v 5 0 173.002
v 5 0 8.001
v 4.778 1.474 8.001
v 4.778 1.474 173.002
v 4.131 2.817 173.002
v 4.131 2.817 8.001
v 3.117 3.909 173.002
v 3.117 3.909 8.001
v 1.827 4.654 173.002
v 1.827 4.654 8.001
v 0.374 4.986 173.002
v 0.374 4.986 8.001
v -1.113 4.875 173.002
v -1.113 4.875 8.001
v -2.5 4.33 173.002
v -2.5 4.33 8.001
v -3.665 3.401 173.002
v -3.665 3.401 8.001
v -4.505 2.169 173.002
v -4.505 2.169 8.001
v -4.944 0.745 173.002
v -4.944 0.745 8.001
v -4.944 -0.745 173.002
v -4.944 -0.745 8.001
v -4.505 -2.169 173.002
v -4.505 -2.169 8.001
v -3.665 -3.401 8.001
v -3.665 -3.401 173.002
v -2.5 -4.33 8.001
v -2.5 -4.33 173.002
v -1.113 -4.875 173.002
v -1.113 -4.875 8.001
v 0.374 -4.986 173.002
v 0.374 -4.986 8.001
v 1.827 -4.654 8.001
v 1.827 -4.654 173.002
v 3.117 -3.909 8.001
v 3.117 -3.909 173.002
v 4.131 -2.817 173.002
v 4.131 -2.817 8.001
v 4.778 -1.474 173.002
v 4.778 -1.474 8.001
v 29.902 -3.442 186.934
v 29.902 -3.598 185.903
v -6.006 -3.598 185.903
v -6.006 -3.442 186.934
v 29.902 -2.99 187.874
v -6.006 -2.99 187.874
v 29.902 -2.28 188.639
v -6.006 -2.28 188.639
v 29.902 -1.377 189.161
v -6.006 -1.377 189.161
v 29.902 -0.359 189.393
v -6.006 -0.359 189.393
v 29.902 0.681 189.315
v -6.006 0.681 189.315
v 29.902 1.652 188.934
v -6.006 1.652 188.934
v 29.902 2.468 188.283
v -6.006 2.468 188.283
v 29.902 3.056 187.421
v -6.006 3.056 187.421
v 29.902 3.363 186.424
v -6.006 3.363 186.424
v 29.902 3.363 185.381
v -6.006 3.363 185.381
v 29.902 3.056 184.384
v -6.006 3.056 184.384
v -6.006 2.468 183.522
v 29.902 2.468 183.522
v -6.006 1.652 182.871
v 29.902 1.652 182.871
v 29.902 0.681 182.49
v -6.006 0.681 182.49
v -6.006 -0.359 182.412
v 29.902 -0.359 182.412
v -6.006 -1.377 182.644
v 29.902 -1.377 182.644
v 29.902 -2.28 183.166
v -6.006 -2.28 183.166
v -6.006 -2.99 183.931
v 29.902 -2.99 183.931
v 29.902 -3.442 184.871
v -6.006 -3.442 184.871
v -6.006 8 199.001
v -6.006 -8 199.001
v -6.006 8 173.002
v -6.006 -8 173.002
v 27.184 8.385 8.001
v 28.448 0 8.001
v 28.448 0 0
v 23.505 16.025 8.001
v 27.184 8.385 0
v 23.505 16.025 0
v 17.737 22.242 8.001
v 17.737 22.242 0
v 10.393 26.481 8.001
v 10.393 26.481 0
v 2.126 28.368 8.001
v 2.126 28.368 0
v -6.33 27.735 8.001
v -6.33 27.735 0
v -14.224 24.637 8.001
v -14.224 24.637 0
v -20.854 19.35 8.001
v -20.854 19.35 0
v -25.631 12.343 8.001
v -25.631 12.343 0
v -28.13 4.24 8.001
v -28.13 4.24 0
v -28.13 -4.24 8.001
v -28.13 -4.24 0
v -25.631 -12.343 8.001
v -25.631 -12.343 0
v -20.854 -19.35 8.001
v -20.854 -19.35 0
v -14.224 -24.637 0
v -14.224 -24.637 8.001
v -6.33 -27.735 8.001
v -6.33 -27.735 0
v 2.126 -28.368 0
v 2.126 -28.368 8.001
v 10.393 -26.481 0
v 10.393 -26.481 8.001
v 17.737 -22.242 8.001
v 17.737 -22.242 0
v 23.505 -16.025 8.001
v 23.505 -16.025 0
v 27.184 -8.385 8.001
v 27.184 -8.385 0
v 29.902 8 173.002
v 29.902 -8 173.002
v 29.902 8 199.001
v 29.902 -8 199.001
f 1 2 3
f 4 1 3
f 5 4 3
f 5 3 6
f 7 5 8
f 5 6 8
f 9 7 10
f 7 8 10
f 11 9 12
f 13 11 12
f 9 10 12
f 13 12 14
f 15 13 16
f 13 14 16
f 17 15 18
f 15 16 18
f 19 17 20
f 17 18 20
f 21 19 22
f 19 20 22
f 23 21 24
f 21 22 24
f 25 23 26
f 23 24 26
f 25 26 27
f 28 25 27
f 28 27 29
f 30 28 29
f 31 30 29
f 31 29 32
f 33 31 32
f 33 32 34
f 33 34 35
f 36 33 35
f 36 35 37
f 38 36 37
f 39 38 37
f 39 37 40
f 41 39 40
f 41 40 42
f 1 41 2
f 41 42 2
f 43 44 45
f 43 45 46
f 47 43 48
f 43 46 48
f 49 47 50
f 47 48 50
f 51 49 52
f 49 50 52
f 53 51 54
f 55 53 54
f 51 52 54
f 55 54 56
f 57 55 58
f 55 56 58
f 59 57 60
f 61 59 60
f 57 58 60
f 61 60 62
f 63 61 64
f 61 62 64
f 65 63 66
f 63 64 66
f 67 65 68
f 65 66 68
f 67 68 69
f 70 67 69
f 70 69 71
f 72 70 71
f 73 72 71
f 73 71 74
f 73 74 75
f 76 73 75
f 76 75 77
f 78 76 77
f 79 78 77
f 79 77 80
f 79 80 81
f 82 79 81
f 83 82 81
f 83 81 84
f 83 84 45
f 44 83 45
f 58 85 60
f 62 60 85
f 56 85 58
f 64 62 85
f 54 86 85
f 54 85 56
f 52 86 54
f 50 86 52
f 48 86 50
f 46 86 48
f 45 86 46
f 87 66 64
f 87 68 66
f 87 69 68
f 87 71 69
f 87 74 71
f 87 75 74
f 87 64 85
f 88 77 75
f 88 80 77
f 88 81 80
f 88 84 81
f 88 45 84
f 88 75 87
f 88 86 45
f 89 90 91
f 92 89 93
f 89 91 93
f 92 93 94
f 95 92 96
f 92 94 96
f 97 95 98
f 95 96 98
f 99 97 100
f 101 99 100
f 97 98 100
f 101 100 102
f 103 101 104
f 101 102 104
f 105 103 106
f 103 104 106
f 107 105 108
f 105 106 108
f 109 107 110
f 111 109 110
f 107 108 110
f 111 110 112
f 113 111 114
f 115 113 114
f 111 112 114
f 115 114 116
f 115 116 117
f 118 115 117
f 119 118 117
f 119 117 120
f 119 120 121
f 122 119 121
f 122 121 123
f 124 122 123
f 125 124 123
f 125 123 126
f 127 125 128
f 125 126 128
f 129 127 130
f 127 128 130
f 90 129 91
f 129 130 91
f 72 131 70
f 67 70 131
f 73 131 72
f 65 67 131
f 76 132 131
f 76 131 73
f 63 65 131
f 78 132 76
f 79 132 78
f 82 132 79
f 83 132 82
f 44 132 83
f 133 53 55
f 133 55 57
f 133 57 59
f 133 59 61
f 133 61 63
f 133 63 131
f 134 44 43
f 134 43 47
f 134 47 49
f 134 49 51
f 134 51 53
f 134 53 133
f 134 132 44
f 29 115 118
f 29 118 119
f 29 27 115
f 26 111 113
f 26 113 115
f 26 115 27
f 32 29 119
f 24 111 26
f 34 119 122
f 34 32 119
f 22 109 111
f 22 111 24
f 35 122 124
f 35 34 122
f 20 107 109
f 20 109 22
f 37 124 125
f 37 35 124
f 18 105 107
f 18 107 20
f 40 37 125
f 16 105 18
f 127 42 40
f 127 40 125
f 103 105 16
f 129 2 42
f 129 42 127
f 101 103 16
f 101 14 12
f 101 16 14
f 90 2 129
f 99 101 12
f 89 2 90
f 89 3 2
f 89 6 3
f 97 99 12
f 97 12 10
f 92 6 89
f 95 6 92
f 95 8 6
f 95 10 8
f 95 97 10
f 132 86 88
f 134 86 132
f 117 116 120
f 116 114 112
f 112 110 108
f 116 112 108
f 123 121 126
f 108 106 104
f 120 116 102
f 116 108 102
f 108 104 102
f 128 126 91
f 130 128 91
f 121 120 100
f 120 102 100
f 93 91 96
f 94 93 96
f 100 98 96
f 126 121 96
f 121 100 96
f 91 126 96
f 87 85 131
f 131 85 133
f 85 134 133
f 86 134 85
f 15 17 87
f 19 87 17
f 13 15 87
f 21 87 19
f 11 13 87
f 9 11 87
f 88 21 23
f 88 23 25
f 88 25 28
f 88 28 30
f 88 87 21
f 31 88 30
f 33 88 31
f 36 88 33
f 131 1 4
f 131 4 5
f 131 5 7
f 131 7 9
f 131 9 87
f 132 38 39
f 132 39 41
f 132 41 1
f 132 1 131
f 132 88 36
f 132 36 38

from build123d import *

# Parameters (mm, degrees)
F0_R     = 28.448
F1_DEPTH = 8.001
F2_R     = 4.99999
F3_DEPTH = 165.00094
F5_DEPTH = 7.99973
F6_R     = 3.50012
F7_DEPTH = 43.9928


with BuildPart() as f1:
    # F0 (on Top) → F1 (new body)
    with BuildSketch(Plane.XY):
        Circle(F0_R)
    extrude(amount=F1_DEPTH)

    # F2 (on face) → F3 (join)
    with BuildSketch(Plane.XY.offset(8.001)):
        Circle(F2_R)
    extrude(amount=F3_DEPTH)

    # F4 (on Front) → F5 (join, symmetric)
    with BuildSketch(Plane.XZ):
        Polygon((-6.00583, 173.00194), (-4.99999, 173.00194), (4.99999, 173.00194), (29.90215, 173.00194), (29.90215, 199.00138), (-6.00583, 199.00138), align=None)
    extrude(amount=F5_DEPTH, both=True)

    # F6 (on face) → F7 (cut)
    with BuildSketch(Plane(origin=(-6.00583, 0, 0), x_dir=(0, -1, 0), z_dir=(-1, 0, 0))):
        with Locations((0.09779, 185.9026)):
            Circle(F6_R)
    extrude(amount=-F7_DEPTH, mode=Mode.SUBTRACT)


solid = f1.part
